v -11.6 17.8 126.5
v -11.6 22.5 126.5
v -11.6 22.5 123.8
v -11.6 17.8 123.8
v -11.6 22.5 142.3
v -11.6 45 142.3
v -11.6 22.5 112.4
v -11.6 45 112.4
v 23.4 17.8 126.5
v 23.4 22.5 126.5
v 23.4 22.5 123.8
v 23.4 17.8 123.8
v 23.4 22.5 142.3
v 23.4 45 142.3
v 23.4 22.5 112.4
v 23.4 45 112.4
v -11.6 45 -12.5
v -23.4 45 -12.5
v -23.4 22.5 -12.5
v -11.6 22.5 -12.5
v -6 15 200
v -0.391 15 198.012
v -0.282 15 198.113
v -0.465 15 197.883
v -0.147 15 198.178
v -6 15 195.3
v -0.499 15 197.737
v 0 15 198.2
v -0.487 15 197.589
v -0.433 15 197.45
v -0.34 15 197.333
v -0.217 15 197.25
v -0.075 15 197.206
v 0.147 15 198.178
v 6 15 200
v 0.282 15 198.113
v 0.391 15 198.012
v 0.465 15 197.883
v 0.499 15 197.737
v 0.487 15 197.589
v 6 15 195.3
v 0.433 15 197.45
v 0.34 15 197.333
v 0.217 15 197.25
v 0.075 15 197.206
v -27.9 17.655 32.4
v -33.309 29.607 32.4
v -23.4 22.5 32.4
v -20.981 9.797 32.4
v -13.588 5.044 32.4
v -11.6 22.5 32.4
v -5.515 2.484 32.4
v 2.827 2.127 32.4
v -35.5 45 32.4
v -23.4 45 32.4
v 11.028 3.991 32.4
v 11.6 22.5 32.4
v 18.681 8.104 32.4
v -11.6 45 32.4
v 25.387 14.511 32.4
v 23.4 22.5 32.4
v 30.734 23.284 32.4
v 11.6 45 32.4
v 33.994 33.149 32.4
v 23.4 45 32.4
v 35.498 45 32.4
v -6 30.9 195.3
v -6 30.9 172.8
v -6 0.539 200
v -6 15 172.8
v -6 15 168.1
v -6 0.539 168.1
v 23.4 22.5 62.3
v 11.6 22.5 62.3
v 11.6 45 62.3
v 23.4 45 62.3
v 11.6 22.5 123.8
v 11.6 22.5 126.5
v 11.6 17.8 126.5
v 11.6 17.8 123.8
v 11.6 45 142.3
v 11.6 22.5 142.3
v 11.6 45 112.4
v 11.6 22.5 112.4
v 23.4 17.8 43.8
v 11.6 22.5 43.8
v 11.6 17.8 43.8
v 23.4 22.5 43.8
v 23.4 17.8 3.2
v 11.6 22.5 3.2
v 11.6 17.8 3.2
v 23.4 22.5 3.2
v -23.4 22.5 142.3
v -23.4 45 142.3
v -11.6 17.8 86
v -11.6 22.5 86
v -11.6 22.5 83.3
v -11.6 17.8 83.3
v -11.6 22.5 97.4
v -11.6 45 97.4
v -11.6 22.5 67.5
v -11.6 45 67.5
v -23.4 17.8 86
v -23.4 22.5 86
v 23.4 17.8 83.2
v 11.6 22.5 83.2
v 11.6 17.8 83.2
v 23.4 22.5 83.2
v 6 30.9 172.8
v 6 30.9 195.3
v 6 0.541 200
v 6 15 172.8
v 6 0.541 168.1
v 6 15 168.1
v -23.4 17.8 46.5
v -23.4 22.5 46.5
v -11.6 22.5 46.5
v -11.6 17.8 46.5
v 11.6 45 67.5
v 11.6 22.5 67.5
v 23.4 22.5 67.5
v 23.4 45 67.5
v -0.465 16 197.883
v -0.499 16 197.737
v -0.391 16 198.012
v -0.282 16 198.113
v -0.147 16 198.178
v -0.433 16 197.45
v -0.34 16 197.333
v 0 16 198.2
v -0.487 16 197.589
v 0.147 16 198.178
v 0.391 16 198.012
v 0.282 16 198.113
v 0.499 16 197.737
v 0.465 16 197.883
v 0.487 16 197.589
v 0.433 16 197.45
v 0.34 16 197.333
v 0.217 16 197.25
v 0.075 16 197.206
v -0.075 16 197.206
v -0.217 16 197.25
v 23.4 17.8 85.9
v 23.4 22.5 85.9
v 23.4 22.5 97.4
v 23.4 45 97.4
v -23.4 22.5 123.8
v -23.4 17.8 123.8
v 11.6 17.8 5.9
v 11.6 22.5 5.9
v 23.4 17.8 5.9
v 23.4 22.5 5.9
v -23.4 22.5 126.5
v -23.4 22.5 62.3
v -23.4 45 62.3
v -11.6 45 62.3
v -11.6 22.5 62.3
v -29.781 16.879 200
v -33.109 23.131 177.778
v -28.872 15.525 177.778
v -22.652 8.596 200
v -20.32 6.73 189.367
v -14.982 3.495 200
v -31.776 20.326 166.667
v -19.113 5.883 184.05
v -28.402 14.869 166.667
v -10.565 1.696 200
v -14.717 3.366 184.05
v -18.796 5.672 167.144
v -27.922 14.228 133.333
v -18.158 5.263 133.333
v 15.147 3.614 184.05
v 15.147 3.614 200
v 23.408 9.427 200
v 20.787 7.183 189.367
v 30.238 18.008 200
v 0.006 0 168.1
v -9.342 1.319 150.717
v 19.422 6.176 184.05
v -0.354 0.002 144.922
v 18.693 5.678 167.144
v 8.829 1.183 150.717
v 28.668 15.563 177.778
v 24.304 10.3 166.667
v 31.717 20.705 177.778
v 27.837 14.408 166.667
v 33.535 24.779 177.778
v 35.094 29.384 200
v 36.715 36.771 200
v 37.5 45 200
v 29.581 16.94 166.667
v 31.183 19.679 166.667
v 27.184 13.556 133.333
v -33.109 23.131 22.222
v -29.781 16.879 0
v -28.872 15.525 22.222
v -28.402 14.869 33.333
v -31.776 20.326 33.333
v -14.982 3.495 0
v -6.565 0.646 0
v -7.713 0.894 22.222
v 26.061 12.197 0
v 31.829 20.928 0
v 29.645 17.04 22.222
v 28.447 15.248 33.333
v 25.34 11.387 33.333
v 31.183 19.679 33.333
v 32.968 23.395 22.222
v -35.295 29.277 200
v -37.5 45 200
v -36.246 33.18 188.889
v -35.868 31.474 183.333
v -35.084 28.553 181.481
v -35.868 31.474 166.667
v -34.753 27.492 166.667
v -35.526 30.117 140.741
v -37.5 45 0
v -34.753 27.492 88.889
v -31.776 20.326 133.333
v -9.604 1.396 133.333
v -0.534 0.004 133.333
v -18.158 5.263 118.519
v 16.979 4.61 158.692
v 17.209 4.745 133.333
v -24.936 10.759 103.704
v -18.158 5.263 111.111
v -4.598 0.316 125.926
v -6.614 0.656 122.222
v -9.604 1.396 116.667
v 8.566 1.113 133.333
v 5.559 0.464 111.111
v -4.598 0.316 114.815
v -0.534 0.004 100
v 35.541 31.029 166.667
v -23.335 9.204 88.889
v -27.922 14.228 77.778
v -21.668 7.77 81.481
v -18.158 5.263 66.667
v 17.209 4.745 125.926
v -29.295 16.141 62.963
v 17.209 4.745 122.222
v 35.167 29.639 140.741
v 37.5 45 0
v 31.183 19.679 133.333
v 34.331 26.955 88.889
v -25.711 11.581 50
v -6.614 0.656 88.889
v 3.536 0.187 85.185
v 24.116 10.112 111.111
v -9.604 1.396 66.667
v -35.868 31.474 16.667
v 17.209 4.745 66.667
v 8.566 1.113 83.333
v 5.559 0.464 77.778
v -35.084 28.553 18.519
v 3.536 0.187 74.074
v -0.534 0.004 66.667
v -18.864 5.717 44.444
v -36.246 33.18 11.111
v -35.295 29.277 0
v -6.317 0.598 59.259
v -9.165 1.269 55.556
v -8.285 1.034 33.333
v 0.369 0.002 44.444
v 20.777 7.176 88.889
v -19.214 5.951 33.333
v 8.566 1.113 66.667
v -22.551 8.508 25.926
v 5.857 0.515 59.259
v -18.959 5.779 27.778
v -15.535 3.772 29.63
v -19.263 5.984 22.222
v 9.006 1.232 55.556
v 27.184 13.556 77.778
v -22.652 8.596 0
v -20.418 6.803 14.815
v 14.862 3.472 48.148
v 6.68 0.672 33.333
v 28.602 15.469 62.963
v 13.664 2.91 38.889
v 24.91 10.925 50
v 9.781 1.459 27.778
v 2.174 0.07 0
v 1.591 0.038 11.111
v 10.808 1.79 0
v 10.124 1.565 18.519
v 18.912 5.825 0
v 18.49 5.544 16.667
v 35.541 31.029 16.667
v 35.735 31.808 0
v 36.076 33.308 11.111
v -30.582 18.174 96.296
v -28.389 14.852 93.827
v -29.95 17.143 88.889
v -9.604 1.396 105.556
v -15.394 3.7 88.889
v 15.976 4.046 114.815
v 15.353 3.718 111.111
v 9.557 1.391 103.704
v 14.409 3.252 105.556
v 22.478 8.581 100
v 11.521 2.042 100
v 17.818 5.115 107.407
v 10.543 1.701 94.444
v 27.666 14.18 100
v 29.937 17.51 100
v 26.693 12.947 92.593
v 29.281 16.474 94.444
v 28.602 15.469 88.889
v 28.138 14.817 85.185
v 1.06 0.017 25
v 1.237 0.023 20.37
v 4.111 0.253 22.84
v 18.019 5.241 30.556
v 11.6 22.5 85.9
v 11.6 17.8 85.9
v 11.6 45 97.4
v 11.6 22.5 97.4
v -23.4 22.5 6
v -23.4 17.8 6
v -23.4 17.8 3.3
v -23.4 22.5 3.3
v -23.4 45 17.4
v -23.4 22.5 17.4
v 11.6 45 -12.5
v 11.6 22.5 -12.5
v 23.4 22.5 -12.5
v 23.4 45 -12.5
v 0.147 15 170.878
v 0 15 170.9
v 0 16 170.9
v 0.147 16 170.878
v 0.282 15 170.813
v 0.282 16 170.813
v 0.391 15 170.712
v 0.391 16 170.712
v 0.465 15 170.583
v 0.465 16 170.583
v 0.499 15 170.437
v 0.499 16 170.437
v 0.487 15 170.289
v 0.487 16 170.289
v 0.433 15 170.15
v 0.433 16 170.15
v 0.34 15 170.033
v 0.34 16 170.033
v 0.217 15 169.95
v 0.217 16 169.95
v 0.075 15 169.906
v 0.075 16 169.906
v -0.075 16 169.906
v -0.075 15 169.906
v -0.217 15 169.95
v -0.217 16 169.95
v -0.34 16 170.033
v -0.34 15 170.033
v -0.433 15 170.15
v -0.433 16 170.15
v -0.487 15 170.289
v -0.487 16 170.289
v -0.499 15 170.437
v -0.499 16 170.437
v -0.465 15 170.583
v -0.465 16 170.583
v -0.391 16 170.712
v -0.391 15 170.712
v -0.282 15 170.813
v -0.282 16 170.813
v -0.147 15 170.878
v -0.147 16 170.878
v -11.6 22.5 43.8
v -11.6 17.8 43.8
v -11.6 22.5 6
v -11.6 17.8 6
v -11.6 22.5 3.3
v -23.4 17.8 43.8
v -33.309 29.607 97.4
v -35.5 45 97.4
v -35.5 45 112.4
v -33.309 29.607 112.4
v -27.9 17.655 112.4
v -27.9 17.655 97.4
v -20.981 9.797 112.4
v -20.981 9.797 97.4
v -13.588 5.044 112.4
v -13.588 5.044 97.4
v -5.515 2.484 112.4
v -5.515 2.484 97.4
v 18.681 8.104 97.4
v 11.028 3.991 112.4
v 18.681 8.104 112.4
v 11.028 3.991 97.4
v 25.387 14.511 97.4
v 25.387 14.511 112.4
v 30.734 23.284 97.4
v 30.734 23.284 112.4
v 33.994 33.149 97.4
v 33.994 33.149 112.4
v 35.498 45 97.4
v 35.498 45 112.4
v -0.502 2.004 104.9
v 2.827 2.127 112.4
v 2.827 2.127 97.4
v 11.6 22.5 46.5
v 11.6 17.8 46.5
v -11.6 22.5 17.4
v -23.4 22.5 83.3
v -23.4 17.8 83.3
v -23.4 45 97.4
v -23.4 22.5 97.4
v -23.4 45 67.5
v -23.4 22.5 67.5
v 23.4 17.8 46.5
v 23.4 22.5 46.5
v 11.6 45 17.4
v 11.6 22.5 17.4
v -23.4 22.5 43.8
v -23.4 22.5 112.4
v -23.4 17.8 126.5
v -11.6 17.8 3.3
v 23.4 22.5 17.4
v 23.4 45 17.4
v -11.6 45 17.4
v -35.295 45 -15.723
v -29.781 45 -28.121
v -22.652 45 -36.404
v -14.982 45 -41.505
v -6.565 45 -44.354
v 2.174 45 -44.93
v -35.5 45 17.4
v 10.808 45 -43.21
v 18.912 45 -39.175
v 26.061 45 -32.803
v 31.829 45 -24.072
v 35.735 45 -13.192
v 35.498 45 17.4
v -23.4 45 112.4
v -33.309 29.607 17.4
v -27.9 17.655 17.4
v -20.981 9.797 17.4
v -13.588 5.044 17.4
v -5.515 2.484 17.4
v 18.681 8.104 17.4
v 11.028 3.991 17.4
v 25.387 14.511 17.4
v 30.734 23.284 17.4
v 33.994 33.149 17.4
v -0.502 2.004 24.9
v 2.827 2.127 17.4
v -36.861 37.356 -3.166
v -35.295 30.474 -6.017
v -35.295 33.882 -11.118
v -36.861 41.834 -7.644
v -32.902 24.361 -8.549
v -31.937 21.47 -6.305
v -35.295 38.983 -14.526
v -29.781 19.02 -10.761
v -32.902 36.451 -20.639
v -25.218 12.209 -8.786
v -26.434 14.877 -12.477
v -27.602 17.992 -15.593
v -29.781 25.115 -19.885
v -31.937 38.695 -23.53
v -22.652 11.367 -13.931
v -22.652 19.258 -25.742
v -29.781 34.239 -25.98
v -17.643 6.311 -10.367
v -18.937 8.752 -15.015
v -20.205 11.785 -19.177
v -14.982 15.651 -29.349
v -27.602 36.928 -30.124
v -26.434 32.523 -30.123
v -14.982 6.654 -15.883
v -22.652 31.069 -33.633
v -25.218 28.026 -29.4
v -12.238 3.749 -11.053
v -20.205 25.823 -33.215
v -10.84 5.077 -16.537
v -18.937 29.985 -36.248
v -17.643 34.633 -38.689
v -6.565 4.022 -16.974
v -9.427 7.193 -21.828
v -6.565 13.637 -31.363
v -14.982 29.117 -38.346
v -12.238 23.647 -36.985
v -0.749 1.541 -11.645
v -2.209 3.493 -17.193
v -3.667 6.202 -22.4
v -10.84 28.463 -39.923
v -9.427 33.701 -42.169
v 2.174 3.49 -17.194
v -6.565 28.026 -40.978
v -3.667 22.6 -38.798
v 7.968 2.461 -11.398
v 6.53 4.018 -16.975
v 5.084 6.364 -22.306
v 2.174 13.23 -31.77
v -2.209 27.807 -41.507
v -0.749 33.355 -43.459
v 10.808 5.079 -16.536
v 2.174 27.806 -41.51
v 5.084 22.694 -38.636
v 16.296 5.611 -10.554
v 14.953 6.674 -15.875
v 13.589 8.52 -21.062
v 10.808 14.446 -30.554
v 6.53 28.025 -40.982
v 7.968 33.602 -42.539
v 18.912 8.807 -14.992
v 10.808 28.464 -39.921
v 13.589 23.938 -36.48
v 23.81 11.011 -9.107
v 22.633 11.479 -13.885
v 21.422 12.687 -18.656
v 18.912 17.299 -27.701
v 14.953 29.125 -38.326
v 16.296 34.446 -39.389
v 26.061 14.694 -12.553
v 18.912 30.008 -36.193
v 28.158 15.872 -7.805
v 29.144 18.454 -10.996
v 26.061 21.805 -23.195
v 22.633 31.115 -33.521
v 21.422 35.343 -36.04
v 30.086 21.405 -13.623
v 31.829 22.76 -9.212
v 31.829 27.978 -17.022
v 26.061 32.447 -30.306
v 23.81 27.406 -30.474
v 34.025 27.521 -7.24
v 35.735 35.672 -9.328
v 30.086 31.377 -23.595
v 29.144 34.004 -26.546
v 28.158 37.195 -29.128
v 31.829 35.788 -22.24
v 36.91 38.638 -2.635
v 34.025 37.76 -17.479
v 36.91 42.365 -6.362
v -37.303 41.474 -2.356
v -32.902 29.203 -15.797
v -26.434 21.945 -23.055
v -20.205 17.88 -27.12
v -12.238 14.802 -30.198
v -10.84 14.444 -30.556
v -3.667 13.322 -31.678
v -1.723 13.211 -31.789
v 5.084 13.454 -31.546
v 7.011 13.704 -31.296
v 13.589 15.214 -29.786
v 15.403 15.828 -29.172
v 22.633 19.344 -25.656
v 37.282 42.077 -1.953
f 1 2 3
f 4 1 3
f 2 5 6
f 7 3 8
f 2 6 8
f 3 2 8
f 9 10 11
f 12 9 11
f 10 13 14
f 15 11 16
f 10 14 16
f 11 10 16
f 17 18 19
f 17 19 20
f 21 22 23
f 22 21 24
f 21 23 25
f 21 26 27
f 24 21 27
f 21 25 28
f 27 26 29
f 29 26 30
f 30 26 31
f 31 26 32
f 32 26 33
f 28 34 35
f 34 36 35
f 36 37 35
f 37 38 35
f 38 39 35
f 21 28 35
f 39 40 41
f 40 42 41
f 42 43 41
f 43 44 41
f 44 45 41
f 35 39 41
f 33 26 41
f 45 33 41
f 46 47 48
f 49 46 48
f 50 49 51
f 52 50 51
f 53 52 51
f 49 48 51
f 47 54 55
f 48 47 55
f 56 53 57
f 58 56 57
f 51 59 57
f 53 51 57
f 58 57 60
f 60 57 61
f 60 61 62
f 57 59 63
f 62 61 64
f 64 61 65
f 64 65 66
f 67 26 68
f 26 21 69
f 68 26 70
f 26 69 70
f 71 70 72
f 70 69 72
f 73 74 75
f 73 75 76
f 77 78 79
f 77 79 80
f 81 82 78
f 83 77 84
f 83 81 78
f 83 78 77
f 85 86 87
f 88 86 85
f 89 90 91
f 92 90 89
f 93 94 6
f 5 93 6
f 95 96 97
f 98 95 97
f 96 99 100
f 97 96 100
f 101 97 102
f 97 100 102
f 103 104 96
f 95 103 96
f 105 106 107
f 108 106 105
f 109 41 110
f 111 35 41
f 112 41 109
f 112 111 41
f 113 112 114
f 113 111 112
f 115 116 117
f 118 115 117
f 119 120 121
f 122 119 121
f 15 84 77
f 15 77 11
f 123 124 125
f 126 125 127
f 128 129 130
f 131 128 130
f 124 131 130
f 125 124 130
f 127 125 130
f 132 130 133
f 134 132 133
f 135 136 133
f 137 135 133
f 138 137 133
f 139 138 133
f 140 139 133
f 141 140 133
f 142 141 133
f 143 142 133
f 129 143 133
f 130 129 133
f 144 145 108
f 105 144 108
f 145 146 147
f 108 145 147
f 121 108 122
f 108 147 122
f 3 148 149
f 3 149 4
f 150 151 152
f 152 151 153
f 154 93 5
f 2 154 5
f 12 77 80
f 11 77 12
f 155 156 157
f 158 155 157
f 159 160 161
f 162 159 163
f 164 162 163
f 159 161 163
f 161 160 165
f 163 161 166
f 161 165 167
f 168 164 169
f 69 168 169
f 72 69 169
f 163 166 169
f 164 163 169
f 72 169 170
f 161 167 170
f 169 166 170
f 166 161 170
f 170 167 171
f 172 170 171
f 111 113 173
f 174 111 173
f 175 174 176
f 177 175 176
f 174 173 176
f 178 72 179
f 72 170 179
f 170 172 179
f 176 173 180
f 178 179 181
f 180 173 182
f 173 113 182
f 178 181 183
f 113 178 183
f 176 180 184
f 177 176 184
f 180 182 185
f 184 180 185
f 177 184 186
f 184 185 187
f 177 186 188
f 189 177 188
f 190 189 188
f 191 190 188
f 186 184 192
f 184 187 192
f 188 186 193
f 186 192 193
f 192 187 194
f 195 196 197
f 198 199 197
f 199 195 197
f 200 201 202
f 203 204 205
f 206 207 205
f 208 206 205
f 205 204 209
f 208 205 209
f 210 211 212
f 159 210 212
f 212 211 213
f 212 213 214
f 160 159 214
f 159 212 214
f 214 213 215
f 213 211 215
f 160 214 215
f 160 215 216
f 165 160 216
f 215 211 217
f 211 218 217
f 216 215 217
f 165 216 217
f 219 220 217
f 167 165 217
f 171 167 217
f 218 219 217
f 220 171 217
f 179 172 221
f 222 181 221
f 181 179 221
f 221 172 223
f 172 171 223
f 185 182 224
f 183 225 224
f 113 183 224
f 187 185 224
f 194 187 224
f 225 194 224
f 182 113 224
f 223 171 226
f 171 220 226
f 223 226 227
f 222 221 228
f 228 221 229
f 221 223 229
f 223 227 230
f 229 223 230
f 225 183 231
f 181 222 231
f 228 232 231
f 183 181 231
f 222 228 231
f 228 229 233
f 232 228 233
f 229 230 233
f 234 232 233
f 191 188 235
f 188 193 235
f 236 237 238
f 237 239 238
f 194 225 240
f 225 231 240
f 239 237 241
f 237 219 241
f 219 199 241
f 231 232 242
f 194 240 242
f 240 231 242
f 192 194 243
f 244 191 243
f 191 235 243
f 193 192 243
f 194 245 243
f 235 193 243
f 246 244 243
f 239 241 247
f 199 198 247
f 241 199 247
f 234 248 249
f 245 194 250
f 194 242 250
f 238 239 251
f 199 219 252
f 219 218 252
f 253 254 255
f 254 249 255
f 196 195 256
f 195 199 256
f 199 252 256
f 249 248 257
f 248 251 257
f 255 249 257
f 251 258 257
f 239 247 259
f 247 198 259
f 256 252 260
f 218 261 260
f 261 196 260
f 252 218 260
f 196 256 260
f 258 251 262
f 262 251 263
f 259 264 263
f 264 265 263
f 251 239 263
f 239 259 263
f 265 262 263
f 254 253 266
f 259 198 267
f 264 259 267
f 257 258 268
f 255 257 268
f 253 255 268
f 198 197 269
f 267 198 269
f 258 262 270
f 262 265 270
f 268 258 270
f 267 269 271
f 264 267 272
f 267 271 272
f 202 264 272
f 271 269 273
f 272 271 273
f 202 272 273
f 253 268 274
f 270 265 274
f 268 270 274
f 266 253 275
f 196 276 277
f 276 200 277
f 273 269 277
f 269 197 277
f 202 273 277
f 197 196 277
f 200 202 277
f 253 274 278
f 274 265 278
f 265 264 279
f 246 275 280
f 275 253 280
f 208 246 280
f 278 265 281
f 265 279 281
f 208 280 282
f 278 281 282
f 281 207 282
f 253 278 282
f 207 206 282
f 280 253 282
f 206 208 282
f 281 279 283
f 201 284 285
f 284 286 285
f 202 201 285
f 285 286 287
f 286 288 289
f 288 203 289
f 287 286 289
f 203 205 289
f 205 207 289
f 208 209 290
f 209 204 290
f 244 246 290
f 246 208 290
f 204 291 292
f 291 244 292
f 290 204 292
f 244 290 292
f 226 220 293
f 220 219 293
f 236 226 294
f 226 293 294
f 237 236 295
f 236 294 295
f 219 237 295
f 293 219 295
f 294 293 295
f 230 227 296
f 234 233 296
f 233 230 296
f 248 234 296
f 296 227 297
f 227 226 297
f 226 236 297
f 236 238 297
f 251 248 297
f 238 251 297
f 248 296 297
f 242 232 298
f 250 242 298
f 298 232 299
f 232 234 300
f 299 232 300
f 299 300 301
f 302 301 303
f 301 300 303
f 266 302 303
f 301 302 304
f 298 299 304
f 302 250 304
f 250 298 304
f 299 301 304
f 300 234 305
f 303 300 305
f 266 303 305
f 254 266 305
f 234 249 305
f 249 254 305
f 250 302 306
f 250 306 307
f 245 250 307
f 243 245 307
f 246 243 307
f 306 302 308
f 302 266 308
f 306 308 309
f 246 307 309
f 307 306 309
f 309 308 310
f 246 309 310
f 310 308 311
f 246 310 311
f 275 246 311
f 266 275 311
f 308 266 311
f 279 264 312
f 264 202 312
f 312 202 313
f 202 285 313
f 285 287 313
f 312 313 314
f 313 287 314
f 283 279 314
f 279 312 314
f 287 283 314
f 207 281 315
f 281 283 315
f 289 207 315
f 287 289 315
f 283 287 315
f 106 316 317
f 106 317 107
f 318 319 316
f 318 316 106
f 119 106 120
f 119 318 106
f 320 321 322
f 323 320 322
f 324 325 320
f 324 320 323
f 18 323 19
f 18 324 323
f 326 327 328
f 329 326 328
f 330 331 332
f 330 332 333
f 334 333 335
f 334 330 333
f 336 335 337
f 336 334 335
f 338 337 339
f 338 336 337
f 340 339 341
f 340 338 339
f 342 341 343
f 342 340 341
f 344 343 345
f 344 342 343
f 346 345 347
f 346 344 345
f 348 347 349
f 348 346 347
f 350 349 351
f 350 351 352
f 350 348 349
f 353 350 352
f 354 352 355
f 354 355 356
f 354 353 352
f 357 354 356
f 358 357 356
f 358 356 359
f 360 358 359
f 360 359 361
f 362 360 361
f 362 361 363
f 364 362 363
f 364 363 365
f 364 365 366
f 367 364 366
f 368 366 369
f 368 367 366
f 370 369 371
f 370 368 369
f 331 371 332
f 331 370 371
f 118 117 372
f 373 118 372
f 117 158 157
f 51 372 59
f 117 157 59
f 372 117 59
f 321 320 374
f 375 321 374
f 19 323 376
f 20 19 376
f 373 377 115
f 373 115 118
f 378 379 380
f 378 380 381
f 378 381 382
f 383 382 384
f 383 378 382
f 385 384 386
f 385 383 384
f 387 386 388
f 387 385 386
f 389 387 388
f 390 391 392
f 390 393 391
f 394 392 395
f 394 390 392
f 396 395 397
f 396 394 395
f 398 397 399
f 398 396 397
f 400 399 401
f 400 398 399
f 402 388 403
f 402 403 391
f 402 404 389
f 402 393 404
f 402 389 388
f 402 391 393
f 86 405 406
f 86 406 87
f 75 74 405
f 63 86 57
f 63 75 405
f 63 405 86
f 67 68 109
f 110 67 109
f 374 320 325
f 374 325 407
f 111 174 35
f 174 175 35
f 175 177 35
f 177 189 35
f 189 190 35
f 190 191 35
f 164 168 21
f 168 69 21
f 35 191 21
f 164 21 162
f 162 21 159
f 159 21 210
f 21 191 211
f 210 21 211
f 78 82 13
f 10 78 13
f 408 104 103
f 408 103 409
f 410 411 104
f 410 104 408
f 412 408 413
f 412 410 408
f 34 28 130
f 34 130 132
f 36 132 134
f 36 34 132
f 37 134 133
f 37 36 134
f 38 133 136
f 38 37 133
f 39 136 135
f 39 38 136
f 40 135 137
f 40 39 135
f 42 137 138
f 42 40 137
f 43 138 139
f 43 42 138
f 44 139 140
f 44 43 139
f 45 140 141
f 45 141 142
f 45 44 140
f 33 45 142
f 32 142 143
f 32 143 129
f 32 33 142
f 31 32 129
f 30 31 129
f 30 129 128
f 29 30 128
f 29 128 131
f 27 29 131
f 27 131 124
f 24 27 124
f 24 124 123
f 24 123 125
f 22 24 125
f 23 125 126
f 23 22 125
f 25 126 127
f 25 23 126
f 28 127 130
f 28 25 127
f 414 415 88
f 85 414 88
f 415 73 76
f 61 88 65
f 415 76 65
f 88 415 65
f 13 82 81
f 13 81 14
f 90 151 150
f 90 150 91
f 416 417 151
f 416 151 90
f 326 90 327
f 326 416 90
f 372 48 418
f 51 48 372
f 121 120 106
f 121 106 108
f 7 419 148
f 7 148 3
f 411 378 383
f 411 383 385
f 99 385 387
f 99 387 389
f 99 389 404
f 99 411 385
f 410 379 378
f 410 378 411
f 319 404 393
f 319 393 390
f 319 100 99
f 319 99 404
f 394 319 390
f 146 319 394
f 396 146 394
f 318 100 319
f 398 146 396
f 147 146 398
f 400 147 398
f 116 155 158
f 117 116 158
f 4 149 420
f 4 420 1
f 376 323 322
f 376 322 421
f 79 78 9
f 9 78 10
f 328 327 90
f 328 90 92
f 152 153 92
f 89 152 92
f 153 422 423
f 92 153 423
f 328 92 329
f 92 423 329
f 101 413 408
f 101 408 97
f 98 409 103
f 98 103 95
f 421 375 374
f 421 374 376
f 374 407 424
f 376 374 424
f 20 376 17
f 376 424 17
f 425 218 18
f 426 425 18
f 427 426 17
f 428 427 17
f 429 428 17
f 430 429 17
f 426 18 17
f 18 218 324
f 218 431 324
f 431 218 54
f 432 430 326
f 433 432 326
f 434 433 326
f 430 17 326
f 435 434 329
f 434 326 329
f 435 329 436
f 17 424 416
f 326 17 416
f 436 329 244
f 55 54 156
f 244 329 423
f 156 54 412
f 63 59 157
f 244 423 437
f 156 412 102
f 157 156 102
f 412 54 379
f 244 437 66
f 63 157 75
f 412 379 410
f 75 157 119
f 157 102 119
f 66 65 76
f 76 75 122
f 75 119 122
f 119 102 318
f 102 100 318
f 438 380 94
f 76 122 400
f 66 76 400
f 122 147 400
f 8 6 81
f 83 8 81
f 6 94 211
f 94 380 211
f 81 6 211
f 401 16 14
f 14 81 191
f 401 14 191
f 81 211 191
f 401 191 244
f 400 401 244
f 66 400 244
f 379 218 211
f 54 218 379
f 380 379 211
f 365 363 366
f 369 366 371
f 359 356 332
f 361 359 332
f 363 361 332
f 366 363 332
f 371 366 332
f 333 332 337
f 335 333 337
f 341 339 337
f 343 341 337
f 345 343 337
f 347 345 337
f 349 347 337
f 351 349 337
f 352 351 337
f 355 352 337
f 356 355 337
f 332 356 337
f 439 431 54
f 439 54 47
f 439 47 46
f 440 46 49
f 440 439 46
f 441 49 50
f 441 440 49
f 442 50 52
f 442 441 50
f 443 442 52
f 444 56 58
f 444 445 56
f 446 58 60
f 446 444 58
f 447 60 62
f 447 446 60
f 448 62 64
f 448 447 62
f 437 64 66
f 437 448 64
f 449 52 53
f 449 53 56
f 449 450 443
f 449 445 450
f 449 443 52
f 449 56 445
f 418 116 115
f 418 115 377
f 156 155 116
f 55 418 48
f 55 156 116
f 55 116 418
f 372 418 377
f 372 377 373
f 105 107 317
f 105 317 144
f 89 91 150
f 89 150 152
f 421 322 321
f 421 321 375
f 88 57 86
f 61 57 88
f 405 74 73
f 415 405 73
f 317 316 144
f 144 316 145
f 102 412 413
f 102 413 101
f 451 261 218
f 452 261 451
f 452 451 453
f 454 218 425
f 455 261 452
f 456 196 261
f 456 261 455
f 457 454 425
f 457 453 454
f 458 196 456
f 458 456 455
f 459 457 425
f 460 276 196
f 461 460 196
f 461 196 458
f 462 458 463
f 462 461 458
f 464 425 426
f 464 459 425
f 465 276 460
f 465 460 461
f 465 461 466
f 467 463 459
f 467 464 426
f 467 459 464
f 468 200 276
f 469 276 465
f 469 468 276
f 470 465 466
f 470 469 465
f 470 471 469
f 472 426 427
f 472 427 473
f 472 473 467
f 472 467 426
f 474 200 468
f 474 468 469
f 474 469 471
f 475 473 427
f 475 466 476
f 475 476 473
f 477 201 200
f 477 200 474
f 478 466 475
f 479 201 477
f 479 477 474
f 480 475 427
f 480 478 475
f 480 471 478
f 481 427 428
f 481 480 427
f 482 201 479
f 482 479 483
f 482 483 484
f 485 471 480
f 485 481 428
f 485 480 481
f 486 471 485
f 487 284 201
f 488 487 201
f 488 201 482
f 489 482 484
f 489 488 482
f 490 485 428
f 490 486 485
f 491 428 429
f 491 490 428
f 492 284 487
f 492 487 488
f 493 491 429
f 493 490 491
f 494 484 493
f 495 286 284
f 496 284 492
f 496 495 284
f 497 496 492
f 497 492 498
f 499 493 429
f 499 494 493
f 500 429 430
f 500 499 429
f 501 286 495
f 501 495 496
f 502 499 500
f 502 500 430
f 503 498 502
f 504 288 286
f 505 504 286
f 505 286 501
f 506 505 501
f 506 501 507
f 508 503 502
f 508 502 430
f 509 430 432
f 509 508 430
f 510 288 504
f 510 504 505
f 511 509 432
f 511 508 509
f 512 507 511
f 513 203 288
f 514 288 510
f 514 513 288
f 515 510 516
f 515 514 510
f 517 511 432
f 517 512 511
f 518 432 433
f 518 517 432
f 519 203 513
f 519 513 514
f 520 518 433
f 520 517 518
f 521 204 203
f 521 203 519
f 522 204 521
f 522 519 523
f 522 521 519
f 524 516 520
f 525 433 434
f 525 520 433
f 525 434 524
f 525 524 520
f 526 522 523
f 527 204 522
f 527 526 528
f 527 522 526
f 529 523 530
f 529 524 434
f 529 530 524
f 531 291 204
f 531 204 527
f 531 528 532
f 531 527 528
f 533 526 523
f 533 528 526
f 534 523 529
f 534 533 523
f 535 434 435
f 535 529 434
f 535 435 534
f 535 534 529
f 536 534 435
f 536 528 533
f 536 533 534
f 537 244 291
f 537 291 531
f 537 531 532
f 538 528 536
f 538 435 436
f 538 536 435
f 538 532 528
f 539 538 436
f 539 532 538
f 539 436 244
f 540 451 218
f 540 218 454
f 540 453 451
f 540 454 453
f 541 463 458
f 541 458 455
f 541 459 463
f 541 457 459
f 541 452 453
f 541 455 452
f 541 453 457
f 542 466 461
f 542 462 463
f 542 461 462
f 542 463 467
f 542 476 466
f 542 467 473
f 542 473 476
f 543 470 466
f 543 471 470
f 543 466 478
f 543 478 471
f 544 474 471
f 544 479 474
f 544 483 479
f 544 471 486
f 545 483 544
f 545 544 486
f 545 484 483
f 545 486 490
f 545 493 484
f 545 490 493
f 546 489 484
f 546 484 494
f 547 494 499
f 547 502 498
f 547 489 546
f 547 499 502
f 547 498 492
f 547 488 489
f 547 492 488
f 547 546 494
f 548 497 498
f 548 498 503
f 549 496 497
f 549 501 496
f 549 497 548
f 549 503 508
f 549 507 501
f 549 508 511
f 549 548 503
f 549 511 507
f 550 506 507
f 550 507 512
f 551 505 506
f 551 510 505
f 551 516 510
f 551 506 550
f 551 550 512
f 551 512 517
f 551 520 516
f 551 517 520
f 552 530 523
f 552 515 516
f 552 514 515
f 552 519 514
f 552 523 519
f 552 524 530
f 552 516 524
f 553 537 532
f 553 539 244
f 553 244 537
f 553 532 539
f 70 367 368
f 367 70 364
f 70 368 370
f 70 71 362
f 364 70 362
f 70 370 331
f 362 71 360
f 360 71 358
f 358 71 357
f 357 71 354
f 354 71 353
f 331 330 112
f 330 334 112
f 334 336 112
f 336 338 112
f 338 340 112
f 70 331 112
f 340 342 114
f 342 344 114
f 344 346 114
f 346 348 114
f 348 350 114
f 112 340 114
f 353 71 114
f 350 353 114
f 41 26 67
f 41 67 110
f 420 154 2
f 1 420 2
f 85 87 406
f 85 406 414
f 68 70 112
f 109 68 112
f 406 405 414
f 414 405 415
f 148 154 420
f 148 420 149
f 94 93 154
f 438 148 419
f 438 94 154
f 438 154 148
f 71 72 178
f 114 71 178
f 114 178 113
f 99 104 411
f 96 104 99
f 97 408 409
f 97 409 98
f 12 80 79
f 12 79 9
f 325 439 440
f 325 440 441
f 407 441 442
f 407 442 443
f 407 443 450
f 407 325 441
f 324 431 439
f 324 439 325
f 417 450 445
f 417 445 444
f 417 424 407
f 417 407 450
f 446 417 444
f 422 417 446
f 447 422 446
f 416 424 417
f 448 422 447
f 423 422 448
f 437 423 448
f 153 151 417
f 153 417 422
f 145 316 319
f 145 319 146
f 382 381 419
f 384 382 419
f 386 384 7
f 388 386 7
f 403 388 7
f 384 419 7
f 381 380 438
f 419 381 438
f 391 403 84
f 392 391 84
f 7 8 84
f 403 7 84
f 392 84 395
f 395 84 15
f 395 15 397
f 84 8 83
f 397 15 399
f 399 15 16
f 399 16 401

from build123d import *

# Parameters (mm, degrees)
BOSS_EXTRUDE1_DEPTH = 200
REVOLVE1_ANGLE      = 90
SKETCH7_W           = 11.8
SKETCH7_H           = 29.9
CUT_EXTRUDE1_DEPTH  = 22.5
CUT_EXTRUDE2_START  = 17.4
CUT_EXTRUDE2_DEPTH  = 15
CUT_EXTRUDE3_START  = -22.5
SKETCH7_4_W         = 11.8
SKETCH7_4_H         = 2.7
CUT_EXTRUDE3_DEPTH  = 4.7
LPATTERN1_COUNT     = 2
LPATTERN1_PITCH     = 80
CUT_EXTRUDE4_START  = -45
SKETCH9_W           = 12
SKETCH9_H           = 31.9
CUT_EXTRUDE4_DEPTH  = 15
CUT_EXTRUDE5_START  = -30
SKETCH9_3_W         = 12
SKETCH9_3_H         = 22.5
CUT_EXTRUDE5_DEPTH  = 15.9
CUT_EXTRUDE7_START  = -30
SKETCH9_4_R         = 0.5
CUT_EXTRUDE7_DEPTH  = 1


# Read off the part's stored shape, not the designer's step: Cut-Extrude2
with BuildPart() as part:
    # Sketch1 → Boss-Extrude1 (new body)
    with BuildSketch(Plane.XY):
        with BuildLine():
            Line((-37.5, 45), (37.5, 45))
            add(Edge.make_bspline(
                [(-37.5, 45), (-36.538066416, -13.829055166), (35.114143496, -16.15963011), (37.5, 45)],
                knots=[0, 0, 0, 0, 1, 1, 1, 1], degree=3))
        make_face()
    extrude(amount=BOSS_EXTRUDE1_DEPTH)

    # Sketch1<2> → Revolve1 (revolve)
    with BuildSketch(Plane.XY):
        with BuildLine():
            Line((37.5, 45), (-37.5, 45))
            add(Edge.make_bspline(
                [(-37.5, 45), (-36.538066416, -13.829055166), (35.114143496, -16.15963011), (37.5, 45)],
                knots=[0, 0, 0, 0, 1, 1, 1, 1], degree=3))
        make_face()
    revolve(axis=Axis((-37.5, 45, 0), (1, 0, 0)), revolution_arc=REVOLVE1_ANGLE)

    # Sketch7 → Cut-Extrude1 (cut)
    with BuildSketch(Plane(origin=(0, 45, 0), x_dir=(1, 0, 0), z_dir=(0, 1, 0))):
        with Locations((-17.5, -2.45)):
            Rectangle(SKETCH7_W, SKETCH7_H)
        with Locations((17.5, -2.45)):
            Rectangle(SKETCH7_W, SKETCH7_H)
        with Locations((-17.5, -47.35)):
            Rectangle(SKETCH7_W, SKETCH7_H)
        with Locations((17.5, -47.35)):
            Rectangle(SKETCH7_W, SKETCH7_H)
    cut_extrude1 = extrude(amount=-CUT_EXTRUDE1_DEPTH, mode=Mode.SUBTRACT)

    # Cut-Extrude2 outline → Cut-Extrude2 (cut)
    with BuildSketch(Plane.XY.offset(CUT_EXTRUDE2_START)):
        with BuildLine():
            Line((35.498438873, 45), (-35.499725066, 45))
            add(Edge.make_bspline(
                [(-35.499725066, 45), (-35.368650609, 37.205082169), (-34.301979481, 30.199561306), (-32.413613618, 23.984635954), (-29.817810175, 18.556811549), (-26.625334767, 13.909452625), (-22.944999564, 10.026846468), (-18.86488359, 6.899280201), (-14.482583961, 4.530449937), (-9.895330776, 2.922239991), (-5.202441131, 2.078686183), (4.195747969, 1.92933157), (8.901042205, 2.622767579), (13.515468258, 4.088792702), (17.941749121, 6.331594499), (22.084774291, 9.360328131), (25.852428778, 13.179838208), (29.158791013, 17.820930982), (31.88915848, 23.308583975), (33.93262988, 29.659944885), (35.173667519, 36.887661716), (35.498438873, 45)],
                knots=[0.000190564, 0.000190564, 0.000190564, 0.000190564, 0.000190564, 0.000190564, 0.000190564, 0.000190564, 0.000190564, 0.000190564, 0.000190564, 0.000190564, 0.5, 0.5, 0.5, 0.5, 0.5, 0.5, 0.5, 0.5, 0.5, 0.5, 0.999563761, 0.999563761, 0.999563761, 0.999563761, 0.999563761, 0.999563761, 0.999563761, 0.999563761, 0.999563761, 0.999563761, 0.999563761, 0.999563761], degree=11))
        make_face()
    cut_extrude2 = extrude(amount=CUT_EXTRUDE2_DEPTH, mode=Mode.SUBTRACT)

    # Sketch7<4> → Cut-Extrude3 (cut)
    with BuildSketch(Plane(origin=(0, 45, 0), x_dir=(1, 0, 0), z_dir=(0, 1, 0)).offset(CUT_EXTRUDE3_START)):
        with Locations((-17.5, -4.65)):
            Rectangle(SKETCH7_4_W, SKETCH7_4_H)
        with Locations((17.5, -4.55)):
            Rectangle(SKETCH7_4_W, SKETCH7_4_H)
        with Locations((17.5, -45.15)):
            Rectangle(SKETCH7_4_W, SKETCH7_4_H)
        with Locations((-17.5, -45.15)):
            Rectangle(SKETCH7_4_W, SKETCH7_4_H)
    cut_extrude3 = extrude(amount=-CUT_EXTRUDE3_DEPTH, mode=Mode.SUBTRACT)

    # LPattern1: Cut-Extrude1, Cut-Extrude2, Cut-Extrude3 ×2
    with Locations(*[(0, 0, i * LPATTERN1_PITCH) for i in range(1, LPATTERN1_COUNT)]):
        add(cut_extrude1, mode=Mode.SUBTRACT)
        add(cut_extrude2, mode=Mode.SUBTRACT)
        add(cut_extrude3, mode=Mode.SUBTRACT)

    # Sketch9 → Cut-Extrude4 (cut)
    with BuildSketch(Plane(origin=(0, 45, 0), x_dir=(1, 0, 0), z_dir=(0, 1, 0)).offset(CUT_EXTRUDE4_START)):
        with Locations((0, -184.05)):
            Rectangle(SKETCH9_W, SKETCH9_H)
    extrude(amount=CUT_EXTRUDE4_DEPTH, mode=Mode.SUBTRACT)

    # Sketch9<3> → Cut-Extrude5 (cut)
    with BuildSketch(Plane(origin=(0, 45, 0), x_dir=(1, 0, 0), z_dir=(0, 1, 0)).offset(CUT_EXTRUDE5_START)):
        with Locations((0, -184.05)):
            Rectangle(SKETCH9_3_W, SKETCH9_3_H)
    extrude(amount=CUT_EXTRUDE5_DEPTH, mode=Mode.SUBTRACT)

    # Sketch9<4> → Cut-Extrude7 (cut)
    with BuildSketch(Plane(origin=(0, 45, 0), x_dir=(1, 0, 0), z_dir=(0, 1, 0)).offset(CUT_EXTRUDE7_START)):
        with Locations(Location((0, -170.4, 0), (0, 0, 270))):
            Circle(SKETCH9_4_R)
        with Locations(Location((0, -197.7, 0), (0, 0, 270))):
            Circle(SKETCH9_4_R)
    extrude(amount=CUT_EXTRUDE7_DEPTH, mode=Mode.SUBTRACT)


solid = part.part
